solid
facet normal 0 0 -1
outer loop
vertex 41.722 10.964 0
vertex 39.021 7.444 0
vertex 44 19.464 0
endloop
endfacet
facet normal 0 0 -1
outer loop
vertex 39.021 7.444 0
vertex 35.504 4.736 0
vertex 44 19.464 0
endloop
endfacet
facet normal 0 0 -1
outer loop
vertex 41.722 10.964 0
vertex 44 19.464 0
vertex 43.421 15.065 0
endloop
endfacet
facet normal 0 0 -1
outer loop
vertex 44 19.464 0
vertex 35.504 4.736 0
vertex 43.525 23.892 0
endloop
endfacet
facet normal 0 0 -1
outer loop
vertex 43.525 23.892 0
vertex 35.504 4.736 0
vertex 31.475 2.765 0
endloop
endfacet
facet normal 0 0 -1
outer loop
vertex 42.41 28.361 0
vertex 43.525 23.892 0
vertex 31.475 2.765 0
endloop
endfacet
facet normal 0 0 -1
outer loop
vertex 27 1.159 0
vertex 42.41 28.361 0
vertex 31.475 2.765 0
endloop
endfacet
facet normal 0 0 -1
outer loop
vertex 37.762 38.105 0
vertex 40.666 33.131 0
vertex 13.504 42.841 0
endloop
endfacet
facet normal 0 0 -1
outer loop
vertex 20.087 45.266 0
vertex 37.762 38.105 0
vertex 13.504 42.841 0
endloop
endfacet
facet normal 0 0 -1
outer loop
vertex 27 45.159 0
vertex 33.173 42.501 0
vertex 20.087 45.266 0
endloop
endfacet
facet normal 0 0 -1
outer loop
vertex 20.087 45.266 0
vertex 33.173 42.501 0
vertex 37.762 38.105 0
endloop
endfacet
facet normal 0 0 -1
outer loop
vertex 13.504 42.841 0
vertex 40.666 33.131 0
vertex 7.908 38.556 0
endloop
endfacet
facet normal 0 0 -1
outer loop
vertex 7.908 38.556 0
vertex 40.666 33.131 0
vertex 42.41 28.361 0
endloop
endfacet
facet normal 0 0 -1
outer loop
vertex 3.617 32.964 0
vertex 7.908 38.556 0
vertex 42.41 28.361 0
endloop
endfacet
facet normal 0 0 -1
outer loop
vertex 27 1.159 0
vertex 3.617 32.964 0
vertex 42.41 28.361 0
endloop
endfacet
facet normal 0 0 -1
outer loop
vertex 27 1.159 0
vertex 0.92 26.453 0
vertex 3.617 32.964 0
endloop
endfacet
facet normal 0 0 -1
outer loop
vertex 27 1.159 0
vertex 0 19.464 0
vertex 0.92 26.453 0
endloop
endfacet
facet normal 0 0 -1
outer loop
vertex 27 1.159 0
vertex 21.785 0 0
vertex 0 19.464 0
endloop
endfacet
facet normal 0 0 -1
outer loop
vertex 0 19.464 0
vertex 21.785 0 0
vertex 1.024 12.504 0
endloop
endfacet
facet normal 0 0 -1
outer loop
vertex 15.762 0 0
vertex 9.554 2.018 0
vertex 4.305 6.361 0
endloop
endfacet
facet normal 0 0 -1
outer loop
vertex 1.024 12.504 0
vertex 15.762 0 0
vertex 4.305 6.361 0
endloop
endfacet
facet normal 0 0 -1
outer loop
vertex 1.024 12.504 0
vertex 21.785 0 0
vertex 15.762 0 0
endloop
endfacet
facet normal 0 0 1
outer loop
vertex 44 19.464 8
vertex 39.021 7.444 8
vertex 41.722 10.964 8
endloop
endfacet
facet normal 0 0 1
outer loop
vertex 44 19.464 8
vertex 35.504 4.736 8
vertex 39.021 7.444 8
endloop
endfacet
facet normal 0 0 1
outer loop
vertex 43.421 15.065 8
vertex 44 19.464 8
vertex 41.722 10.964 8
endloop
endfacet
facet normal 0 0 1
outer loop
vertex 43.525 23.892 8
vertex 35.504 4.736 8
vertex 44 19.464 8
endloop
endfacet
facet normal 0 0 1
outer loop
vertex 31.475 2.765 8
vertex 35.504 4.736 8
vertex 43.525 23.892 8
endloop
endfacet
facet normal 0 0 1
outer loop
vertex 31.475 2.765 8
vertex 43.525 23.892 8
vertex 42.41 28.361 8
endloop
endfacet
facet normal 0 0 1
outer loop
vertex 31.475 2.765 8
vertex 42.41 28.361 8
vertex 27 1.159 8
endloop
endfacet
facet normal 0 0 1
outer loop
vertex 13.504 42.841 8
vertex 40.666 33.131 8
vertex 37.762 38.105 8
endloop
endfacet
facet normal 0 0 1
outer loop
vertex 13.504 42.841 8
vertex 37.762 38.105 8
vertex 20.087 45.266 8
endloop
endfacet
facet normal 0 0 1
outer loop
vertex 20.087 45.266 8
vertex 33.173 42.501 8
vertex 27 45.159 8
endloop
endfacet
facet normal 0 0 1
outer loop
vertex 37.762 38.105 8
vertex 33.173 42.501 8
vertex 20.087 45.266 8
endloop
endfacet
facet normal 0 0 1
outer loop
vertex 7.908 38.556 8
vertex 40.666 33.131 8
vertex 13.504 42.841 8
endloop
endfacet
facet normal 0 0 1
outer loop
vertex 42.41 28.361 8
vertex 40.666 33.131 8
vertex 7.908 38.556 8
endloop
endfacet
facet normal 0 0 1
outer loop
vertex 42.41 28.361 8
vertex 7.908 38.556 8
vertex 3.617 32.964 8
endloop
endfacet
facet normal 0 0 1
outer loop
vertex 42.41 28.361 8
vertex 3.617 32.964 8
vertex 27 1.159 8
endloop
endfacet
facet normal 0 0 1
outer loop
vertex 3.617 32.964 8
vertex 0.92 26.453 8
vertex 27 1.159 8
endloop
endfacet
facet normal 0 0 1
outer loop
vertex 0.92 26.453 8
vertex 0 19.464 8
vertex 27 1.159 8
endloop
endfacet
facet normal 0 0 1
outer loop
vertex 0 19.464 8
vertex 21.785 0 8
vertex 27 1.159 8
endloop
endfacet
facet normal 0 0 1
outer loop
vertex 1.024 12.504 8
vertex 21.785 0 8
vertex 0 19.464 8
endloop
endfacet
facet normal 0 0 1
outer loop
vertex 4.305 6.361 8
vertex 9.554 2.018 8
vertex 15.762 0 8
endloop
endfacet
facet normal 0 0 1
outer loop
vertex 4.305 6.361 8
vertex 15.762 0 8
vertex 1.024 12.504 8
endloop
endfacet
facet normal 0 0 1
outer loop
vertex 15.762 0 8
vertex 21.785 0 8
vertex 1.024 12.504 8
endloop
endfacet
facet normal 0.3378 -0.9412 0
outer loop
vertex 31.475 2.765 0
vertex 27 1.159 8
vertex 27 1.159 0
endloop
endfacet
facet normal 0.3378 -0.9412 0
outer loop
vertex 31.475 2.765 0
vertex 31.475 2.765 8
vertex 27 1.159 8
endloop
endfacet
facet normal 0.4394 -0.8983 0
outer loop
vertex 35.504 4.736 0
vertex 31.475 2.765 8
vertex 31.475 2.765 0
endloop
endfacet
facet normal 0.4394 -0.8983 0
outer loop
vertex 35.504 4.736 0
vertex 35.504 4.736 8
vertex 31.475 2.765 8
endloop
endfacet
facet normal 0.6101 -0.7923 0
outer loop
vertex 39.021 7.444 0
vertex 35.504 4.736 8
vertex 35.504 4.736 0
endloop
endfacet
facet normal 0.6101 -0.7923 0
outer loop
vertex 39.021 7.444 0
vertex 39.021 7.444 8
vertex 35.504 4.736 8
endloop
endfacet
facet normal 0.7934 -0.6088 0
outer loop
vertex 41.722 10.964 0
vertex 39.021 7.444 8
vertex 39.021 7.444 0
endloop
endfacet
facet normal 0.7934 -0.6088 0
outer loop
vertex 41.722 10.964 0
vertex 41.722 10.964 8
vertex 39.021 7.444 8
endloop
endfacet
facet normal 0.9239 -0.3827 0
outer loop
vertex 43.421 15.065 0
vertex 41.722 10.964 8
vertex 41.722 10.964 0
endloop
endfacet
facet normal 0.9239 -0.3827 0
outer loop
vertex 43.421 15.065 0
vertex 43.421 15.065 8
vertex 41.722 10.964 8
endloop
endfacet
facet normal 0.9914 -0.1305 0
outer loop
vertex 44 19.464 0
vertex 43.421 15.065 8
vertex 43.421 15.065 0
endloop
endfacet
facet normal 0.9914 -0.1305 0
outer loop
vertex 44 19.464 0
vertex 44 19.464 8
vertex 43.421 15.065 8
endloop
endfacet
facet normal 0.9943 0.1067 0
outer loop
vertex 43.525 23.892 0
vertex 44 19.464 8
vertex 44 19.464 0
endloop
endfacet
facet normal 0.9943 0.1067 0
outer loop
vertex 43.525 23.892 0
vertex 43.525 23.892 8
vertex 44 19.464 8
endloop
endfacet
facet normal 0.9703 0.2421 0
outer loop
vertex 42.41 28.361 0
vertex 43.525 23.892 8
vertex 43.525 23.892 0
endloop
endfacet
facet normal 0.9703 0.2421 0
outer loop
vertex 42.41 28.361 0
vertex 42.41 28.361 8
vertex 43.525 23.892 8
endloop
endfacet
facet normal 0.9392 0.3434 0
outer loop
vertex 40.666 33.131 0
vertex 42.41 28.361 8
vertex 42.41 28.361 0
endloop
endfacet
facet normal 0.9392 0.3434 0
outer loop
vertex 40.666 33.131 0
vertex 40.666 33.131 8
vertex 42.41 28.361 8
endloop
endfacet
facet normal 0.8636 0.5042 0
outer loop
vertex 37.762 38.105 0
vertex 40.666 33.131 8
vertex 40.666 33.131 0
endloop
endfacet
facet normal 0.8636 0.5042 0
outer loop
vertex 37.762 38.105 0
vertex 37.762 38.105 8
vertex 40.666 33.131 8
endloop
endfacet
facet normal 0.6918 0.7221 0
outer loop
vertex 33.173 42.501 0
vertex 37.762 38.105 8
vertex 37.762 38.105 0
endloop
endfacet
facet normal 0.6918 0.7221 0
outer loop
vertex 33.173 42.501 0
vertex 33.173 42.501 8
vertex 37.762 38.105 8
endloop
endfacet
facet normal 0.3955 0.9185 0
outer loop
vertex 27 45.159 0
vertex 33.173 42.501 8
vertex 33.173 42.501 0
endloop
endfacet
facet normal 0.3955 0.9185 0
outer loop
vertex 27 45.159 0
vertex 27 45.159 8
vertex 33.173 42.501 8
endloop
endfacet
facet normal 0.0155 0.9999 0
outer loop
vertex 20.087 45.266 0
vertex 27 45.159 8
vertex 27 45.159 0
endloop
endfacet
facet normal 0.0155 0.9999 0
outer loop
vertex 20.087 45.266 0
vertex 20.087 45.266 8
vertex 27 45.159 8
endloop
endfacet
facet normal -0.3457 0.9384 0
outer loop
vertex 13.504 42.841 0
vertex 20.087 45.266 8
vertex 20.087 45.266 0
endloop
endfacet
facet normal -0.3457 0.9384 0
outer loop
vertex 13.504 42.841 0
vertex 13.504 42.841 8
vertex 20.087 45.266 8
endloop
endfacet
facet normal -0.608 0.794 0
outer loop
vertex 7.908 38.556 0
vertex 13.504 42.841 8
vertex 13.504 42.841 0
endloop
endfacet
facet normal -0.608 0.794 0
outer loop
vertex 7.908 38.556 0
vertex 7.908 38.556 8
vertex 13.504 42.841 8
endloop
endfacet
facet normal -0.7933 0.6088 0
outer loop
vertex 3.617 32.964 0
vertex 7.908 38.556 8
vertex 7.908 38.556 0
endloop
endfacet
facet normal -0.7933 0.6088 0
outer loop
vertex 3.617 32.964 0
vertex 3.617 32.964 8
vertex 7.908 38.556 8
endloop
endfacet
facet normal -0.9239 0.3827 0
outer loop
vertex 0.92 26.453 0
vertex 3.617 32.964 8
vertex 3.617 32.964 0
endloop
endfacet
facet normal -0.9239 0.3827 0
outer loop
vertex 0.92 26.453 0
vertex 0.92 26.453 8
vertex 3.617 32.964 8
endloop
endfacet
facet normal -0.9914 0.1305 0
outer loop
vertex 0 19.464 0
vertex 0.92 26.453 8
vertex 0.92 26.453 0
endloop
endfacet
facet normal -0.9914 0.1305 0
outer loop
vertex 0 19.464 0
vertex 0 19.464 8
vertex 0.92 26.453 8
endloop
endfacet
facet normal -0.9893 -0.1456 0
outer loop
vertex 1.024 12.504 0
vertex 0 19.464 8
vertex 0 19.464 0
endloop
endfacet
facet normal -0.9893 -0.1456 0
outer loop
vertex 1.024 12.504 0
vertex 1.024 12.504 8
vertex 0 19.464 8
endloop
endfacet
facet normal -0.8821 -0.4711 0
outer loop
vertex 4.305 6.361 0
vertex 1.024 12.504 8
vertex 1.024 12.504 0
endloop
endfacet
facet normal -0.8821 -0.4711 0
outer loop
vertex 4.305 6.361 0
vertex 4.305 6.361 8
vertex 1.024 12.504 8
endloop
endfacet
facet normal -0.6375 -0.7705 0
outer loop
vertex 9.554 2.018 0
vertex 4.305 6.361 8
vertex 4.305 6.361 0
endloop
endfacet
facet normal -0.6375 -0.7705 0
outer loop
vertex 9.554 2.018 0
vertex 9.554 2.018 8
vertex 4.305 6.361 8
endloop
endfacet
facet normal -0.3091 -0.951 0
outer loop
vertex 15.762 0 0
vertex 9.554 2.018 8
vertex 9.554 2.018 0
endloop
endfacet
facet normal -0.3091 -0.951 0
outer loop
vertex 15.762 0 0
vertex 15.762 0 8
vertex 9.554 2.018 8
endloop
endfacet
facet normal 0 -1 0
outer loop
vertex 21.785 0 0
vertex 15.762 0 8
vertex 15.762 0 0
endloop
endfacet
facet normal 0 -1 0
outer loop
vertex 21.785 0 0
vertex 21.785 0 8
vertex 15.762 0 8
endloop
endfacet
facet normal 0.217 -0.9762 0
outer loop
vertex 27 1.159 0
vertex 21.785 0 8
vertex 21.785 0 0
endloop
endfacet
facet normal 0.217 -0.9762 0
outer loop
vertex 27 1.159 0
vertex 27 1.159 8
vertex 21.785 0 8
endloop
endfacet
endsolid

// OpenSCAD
$fn = 32;

// ----------------------------------------------------------------------
// Cam disc: base radius 17.0 mm, lift 10.0 mm, 24 profile points
// ----------------------------------------------------------------------

// --- parameters (mm) ---
profile_height = 8;       // extrusion height
profile_points = 24;      // points of the closed outline

profile = [[44, 19.464], [43.525, 23.892], [42.41, 28.361], [40.666, 33.131], [37.762, 38.105], [33.173, 42.501], [27, 45.159], [20.087, 45.266], [13.504, 42.841], [7.908, 38.556], [3.617, 32.964], [0.92, 26.453], [0, 19.464], [1.024, 12.504], [4.305, 6.361], [9.554, 2.018], [15.762, 0], [21.785, 0], [27, 1.159], [31.475, 2.765], [35.504, 4.736], [39.021, 7.444], [41.722, 10.964], [43.421, 15.065]];  // single closed polygon, 24 points, counter clockwise

// --- the one profile operation ---
linear_extrude(height = profile_height) polygon(points = profile);
